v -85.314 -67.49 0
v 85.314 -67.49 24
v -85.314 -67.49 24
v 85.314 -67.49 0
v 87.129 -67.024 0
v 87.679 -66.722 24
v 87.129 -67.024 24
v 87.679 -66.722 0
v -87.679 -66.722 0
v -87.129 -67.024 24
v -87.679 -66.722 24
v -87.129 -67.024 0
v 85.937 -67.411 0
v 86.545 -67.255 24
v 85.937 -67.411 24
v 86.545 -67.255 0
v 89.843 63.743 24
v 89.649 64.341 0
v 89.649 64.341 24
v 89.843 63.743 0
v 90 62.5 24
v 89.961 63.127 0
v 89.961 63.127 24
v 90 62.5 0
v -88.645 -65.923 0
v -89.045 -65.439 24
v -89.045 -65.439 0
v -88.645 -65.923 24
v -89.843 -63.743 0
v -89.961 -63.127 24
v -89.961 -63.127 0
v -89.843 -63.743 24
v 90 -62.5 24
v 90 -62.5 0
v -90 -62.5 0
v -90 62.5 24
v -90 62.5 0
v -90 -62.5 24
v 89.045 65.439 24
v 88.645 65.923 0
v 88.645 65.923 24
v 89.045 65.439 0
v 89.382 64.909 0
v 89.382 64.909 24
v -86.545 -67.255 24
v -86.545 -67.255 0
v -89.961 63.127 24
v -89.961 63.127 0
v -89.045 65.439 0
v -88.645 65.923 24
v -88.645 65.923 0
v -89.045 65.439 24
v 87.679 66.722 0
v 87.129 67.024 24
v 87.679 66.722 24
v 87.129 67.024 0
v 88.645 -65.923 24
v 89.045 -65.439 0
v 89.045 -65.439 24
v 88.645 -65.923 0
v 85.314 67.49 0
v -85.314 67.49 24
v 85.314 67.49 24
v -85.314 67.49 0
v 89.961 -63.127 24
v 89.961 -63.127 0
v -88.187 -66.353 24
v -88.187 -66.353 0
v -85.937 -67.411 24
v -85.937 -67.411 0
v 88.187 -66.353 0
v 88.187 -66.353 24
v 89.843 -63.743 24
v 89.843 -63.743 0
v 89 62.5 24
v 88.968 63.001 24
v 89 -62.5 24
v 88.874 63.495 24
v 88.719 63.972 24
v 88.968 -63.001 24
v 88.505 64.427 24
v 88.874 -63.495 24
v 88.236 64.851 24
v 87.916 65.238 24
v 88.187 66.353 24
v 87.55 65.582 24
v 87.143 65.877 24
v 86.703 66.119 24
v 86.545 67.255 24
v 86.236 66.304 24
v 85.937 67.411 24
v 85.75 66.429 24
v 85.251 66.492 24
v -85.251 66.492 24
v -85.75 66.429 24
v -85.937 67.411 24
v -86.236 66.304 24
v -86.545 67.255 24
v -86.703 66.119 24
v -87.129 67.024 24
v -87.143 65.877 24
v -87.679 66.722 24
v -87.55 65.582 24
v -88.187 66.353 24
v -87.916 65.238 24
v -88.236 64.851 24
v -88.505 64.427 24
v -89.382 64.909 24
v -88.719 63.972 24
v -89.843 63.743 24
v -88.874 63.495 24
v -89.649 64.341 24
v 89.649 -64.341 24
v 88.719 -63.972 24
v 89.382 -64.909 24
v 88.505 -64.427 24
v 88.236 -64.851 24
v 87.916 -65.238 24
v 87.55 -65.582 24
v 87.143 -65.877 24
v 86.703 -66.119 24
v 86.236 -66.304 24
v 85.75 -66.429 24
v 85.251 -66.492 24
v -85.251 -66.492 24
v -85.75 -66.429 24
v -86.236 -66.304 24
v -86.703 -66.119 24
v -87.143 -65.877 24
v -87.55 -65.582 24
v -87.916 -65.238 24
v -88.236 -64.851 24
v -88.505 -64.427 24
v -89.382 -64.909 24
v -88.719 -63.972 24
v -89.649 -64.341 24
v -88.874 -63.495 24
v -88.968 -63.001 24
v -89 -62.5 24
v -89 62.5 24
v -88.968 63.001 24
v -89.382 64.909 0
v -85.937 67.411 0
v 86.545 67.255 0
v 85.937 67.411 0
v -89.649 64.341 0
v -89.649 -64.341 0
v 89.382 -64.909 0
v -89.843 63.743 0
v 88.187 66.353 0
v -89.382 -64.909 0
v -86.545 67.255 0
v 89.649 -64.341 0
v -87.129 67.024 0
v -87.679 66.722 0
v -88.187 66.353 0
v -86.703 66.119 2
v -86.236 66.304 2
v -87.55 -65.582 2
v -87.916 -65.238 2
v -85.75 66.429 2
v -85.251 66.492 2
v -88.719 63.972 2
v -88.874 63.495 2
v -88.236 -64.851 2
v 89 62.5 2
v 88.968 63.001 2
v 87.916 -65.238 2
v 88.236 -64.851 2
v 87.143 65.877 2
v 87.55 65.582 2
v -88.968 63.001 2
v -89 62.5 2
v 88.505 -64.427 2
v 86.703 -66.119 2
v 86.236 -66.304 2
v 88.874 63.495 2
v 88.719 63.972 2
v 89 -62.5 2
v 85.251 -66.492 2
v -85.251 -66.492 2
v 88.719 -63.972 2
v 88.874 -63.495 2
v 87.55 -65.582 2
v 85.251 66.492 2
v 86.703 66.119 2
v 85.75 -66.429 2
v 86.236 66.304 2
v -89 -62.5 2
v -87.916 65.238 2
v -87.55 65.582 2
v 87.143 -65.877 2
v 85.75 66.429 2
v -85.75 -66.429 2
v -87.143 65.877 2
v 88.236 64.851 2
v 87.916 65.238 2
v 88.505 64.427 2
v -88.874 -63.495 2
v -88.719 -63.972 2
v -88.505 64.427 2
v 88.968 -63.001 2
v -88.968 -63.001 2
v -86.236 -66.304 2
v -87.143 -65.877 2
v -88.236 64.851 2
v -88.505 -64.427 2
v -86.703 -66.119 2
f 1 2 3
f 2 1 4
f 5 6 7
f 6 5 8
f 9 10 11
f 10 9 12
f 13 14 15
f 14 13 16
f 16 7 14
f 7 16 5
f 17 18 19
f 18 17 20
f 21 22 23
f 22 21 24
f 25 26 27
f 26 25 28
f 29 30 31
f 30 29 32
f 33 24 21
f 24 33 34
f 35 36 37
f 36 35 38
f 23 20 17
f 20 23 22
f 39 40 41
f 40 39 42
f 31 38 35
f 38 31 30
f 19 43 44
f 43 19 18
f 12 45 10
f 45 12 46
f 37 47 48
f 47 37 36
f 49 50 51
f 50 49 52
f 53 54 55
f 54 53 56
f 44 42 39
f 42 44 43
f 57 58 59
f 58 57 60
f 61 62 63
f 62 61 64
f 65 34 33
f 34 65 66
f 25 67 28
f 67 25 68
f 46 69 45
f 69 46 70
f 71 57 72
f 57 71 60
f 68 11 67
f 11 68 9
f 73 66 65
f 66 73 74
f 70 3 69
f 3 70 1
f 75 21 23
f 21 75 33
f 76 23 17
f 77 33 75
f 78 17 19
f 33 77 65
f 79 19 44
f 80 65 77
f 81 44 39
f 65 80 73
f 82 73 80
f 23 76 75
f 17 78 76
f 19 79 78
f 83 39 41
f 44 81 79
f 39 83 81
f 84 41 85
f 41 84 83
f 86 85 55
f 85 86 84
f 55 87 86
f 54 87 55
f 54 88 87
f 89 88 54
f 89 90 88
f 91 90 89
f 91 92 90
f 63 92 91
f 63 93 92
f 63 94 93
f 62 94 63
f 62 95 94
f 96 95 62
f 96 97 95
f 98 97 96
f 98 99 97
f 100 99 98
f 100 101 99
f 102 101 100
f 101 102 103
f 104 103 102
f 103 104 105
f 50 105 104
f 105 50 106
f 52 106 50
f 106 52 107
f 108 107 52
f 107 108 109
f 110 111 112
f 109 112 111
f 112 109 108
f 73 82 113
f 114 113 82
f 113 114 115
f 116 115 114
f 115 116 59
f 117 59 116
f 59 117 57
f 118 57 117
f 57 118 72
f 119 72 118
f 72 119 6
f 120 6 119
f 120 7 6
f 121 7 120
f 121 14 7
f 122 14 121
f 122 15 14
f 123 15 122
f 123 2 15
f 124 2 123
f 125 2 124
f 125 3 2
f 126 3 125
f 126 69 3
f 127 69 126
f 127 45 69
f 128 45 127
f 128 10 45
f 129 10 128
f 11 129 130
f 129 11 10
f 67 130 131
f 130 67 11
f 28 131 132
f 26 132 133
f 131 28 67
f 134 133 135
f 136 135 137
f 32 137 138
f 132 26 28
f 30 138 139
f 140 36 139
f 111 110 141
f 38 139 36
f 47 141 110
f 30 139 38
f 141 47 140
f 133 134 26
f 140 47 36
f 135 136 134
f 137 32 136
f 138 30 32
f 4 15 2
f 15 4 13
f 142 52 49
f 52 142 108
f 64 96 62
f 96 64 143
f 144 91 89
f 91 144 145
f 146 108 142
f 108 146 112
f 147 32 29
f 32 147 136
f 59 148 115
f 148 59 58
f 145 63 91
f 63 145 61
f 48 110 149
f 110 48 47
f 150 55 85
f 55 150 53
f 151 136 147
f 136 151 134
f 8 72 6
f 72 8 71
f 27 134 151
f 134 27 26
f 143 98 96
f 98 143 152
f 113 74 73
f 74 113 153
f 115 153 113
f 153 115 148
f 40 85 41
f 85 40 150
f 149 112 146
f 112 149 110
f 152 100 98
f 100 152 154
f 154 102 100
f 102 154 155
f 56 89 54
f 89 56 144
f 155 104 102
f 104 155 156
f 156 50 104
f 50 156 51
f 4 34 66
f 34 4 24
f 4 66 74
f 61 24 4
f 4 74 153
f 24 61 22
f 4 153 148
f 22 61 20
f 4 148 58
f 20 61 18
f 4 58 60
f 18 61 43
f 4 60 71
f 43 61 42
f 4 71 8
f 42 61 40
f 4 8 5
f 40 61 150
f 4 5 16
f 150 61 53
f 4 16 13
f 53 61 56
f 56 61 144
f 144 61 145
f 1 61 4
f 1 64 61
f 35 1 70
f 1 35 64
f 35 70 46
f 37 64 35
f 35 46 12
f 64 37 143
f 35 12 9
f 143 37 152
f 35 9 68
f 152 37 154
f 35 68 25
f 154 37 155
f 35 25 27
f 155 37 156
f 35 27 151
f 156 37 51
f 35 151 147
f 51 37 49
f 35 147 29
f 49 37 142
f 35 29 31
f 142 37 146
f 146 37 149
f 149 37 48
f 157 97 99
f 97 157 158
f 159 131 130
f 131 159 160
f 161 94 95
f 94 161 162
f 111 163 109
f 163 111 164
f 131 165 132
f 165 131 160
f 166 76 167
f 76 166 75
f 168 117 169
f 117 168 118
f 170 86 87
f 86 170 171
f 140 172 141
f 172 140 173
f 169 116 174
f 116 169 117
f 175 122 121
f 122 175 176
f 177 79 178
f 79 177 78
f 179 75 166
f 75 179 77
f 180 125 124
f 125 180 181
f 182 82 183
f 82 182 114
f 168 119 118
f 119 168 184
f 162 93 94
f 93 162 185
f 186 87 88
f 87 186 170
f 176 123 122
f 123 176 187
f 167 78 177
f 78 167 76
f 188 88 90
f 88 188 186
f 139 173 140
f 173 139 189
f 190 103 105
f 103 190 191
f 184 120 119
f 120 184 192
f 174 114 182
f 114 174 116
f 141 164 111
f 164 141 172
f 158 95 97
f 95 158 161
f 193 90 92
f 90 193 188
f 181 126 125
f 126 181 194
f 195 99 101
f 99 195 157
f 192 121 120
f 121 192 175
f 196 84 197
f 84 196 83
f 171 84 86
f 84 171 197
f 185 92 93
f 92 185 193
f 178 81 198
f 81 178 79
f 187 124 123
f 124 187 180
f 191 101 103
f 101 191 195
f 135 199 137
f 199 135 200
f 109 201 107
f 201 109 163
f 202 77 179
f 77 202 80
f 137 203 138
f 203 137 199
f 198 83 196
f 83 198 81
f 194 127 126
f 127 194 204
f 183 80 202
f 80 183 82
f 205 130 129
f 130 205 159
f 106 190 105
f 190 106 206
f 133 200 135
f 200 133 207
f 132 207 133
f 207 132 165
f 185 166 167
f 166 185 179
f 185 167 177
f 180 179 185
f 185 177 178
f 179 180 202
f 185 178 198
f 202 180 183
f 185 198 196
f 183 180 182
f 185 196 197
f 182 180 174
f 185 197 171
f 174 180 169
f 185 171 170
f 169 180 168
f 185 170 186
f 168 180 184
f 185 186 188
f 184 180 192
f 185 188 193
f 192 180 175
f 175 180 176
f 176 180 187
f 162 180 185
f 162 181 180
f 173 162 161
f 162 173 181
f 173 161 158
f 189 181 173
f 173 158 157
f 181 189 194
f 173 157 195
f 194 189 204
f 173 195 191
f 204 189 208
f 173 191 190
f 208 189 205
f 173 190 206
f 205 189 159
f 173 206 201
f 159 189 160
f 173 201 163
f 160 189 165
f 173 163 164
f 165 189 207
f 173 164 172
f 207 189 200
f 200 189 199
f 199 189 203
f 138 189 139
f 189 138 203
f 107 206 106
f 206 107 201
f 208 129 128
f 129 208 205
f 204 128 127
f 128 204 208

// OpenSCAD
$fn = 50;


difference() {
	union() {
		hull() {
			translate(v = [-85.0000000000, 62.5000000000, 0]) {
				cylinder(h = 24, r = 5);
			}
			translate(v = [85.0000000000, 62.5000000000, 0]) {
				cylinder(h = 24, r = 5);
			}
			translate(v = [-85.0000000000, -62.5000000000, 0]) {
				cylinder(h = 24, r = 5);
			}
			translate(v = [85.0000000000, -62.5000000000, 0]) {
				cylinder(h = 24, r = 5);
			}
		}
	}
	union() {
		translate(v = [0, 0, 2]) {
			hull() {
				translate(v = [-85.0000000000, 62.5000000000, 0]) {
					cylinder(h = 22, r = 4);
				}
				translate(v = [85.0000000000, 62.5000000000, 0]) {
					cylinder(h = 22, r = 4);
				}
				translate(v = [-85.0000000000, -62.5000000000, 0]) {
					cylinder(h = 22, r = 4);
				}
				translate(v = [85.0000000000, -62.5000000000, 0]) {
					cylinder(h = 22, r = 4);
				}
			}
		}
	}
}
